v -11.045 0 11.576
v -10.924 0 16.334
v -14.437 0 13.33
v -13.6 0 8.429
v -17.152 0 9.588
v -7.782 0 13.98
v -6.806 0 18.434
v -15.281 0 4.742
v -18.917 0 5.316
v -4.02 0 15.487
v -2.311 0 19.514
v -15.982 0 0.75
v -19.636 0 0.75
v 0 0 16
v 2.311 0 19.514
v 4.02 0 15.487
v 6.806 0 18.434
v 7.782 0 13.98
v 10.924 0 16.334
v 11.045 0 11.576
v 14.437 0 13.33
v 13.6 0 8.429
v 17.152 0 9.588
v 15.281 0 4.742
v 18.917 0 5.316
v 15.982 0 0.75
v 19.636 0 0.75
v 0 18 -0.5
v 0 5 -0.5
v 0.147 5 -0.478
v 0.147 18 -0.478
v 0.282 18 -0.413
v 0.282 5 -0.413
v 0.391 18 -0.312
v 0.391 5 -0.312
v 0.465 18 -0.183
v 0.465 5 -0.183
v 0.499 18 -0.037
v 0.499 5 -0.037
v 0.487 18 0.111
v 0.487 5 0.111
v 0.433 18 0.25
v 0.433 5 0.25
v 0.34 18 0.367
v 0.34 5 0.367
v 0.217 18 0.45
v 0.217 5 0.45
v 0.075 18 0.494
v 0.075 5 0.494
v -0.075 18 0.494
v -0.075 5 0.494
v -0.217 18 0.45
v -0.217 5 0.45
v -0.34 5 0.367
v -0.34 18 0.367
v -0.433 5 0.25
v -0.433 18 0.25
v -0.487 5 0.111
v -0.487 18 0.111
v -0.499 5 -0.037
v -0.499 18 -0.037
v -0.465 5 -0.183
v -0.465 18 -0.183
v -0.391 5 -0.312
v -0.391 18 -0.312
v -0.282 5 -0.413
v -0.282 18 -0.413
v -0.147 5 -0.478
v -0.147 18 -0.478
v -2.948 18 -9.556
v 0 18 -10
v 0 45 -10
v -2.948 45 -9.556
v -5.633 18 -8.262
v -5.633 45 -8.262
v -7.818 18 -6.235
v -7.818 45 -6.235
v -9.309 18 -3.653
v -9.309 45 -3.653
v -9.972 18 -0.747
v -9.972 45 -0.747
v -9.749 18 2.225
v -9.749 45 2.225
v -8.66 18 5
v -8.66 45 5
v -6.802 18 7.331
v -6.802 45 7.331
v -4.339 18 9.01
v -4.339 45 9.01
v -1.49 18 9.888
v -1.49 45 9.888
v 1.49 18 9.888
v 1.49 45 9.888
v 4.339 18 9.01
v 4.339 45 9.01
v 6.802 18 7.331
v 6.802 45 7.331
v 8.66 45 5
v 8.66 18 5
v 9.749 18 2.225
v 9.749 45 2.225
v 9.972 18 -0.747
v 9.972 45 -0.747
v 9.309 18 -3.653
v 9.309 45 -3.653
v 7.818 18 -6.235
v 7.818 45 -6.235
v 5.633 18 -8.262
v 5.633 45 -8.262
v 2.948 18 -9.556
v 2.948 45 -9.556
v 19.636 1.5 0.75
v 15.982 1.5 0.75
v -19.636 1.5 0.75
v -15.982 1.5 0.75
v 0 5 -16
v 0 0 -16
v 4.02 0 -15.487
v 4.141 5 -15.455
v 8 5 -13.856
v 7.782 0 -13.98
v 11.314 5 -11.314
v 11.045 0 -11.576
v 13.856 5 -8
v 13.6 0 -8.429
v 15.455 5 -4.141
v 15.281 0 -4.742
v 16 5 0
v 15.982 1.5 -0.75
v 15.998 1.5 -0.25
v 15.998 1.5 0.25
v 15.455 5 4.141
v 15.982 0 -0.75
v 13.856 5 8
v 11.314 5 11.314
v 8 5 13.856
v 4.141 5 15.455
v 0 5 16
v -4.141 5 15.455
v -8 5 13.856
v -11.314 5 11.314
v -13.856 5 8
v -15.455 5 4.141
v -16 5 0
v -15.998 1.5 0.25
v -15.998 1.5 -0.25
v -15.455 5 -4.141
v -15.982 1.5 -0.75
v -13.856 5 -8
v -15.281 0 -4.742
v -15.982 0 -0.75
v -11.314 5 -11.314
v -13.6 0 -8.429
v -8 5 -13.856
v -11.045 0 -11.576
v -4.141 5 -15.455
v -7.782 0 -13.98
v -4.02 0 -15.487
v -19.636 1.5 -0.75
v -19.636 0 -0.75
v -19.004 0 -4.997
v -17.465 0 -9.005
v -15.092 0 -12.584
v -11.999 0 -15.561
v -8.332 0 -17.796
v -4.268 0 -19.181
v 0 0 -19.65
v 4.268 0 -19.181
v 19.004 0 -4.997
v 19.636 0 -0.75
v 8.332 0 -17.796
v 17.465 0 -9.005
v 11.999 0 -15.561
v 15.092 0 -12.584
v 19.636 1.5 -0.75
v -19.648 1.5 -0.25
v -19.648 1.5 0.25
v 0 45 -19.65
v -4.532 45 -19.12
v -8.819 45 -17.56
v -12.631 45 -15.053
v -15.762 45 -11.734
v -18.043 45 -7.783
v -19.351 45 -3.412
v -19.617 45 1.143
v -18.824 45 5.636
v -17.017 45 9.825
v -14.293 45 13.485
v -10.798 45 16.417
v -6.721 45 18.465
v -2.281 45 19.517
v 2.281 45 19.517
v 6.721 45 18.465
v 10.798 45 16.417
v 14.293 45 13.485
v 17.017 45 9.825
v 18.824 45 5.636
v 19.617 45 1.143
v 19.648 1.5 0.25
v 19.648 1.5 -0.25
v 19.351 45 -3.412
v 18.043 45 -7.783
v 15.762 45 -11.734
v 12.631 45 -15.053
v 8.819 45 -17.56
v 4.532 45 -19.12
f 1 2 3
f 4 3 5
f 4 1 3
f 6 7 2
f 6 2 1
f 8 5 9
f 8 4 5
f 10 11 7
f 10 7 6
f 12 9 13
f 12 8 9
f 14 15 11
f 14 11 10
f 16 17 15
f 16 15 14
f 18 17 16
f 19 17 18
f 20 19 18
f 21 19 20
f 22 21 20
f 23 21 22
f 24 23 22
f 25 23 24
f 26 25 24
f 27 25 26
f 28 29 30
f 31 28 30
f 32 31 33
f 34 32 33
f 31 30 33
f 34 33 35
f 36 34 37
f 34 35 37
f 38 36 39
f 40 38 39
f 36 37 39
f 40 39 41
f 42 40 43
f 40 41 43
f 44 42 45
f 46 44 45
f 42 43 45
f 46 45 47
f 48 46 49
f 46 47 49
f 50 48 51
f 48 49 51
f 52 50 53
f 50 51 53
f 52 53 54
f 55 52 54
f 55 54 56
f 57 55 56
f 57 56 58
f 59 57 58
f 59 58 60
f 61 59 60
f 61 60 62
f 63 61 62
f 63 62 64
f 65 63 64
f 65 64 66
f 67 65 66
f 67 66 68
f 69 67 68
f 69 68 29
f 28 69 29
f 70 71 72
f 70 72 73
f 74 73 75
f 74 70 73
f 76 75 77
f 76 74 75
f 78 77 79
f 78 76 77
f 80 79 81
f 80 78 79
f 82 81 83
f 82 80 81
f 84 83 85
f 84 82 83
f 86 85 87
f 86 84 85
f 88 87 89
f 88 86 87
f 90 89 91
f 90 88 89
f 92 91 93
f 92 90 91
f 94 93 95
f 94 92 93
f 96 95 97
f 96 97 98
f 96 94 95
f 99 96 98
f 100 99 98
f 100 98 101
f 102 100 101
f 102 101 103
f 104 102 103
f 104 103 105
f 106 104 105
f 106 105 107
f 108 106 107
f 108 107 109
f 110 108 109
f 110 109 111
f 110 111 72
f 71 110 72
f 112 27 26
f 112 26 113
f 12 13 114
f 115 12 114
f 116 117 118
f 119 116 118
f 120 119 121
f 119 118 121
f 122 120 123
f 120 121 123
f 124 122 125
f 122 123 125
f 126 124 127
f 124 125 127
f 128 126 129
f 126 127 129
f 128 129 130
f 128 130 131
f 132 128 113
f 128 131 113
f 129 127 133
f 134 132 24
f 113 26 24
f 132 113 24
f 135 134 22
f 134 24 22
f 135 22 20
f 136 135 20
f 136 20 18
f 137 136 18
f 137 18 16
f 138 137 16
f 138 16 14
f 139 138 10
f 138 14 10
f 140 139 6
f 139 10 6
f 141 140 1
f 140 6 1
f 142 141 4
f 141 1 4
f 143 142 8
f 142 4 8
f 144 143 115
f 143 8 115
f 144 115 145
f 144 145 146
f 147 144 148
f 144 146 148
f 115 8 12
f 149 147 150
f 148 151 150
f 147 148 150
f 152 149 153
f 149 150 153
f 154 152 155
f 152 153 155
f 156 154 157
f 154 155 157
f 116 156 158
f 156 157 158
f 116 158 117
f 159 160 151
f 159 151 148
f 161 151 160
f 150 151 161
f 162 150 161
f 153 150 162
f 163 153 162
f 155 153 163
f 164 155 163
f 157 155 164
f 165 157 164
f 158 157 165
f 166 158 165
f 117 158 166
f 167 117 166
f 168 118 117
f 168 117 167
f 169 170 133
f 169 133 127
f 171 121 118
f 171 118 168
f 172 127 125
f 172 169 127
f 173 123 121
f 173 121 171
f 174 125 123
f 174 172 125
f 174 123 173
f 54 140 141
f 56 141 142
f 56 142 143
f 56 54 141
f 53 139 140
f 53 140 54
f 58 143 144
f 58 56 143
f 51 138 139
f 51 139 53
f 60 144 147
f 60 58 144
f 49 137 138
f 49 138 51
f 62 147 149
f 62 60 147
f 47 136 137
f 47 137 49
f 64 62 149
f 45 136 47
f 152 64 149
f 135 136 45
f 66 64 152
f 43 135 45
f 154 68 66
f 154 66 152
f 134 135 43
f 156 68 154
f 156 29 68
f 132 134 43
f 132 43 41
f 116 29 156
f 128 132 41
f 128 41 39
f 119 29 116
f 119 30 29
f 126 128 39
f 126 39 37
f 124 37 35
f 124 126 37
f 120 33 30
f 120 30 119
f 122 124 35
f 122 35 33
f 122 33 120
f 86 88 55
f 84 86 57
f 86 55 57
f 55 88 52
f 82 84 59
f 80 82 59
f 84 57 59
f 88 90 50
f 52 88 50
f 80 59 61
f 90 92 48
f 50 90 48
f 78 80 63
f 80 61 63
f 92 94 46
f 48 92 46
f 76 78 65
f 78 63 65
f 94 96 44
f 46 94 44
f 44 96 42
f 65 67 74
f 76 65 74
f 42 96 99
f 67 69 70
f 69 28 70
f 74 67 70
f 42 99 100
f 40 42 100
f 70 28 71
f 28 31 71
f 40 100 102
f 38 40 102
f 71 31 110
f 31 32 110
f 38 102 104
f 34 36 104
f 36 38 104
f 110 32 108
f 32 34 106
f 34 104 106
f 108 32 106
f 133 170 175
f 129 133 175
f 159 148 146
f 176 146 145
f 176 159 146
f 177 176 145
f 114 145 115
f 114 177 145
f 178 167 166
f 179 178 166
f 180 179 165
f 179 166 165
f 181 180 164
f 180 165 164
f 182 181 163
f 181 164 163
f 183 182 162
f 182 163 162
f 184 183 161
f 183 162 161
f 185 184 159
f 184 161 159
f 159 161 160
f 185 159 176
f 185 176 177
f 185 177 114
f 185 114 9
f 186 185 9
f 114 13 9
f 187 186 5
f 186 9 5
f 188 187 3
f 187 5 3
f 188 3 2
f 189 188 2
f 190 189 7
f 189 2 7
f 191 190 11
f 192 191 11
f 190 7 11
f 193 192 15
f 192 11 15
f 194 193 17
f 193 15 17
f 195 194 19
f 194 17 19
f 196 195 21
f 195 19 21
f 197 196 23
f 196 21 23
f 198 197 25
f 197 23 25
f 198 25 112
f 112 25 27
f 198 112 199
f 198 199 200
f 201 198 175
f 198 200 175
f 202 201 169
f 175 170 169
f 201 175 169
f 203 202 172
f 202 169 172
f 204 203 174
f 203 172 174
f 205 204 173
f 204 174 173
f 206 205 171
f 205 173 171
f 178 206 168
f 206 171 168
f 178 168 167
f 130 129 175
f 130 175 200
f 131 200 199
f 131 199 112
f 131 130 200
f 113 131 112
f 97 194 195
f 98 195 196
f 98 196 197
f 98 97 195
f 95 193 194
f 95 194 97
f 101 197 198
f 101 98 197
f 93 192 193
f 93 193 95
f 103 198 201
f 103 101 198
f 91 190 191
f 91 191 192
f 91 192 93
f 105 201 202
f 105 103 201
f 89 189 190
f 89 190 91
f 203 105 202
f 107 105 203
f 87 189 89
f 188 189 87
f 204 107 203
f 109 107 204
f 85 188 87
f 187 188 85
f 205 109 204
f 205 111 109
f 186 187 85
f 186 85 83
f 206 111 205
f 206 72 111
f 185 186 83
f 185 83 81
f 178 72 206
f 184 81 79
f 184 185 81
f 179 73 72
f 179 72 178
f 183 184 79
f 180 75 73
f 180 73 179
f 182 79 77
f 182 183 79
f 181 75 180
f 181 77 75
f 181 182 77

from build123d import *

# Parameters (mm, degrees)
SKETCH_1_R          = 19.65
SKETCH_1_R_2        = 10
EXTRUDE_1_DEPTH     = 45
SKETCH_2_R          = 10
SKETCH_2_R_2        = 0.5
EXTRUDE_2_DEPTH     = 18
SKETCH_3_R          = 16
CUT_EXTRUDE_1_DEPTH = 5
SKETCH_5_W          = 1.5
SKETCH_5_H          = 1.5
CUT_EXTRUDE_2_DEPTH = 63.5


with BuildPart() as part:
    # 草图1 → 凸台-拉伸1 (new body)
    with BuildSketch(Plane(origin=(0, 0, 0), x_dir=(1, 0, 0), z_dir=(0, 1, 0))):
        Circle(SKETCH_1_R)
        Circle(SKETCH_1_R_2, mode=Mode.SUBTRACT)
    extrude(amount=EXTRUDE_1_DEPTH)

    # 草图2 → 凸台-拉伸2 (add)
    with BuildSketch(Plane.XZ):
        Circle(SKETCH_2_R)
        Circle(SKETCH_2_R_2, mode=Mode.SUBTRACT)
    extrude(amount=-EXTRUDE_2_DEPTH)

    # 草图3 → 切除-拉伸1 (cut)
    with BuildSketch(Plane.XZ):
        Circle(SKETCH_3_R)
    extrude(amount=-CUT_EXTRUDE_1_DEPTH, mode=Mode.SUBTRACT)

    # 草图5 → 切除-拉伸2 (cut, symmetric)
    with BuildSketch(Plane(origin=(0, 45, 0), x_dir=(0, 0, 1), z_dir=(-1, 0, 0))):
        with Locations((0, -44.25)):
            Rectangle(SKETCH_5_W, SKETCH_5_H)
    extrude(amount=CUT_EXTRUDE_2_DEPTH, both=True, mode=Mode.SUBTRACT)


solid = part.part
